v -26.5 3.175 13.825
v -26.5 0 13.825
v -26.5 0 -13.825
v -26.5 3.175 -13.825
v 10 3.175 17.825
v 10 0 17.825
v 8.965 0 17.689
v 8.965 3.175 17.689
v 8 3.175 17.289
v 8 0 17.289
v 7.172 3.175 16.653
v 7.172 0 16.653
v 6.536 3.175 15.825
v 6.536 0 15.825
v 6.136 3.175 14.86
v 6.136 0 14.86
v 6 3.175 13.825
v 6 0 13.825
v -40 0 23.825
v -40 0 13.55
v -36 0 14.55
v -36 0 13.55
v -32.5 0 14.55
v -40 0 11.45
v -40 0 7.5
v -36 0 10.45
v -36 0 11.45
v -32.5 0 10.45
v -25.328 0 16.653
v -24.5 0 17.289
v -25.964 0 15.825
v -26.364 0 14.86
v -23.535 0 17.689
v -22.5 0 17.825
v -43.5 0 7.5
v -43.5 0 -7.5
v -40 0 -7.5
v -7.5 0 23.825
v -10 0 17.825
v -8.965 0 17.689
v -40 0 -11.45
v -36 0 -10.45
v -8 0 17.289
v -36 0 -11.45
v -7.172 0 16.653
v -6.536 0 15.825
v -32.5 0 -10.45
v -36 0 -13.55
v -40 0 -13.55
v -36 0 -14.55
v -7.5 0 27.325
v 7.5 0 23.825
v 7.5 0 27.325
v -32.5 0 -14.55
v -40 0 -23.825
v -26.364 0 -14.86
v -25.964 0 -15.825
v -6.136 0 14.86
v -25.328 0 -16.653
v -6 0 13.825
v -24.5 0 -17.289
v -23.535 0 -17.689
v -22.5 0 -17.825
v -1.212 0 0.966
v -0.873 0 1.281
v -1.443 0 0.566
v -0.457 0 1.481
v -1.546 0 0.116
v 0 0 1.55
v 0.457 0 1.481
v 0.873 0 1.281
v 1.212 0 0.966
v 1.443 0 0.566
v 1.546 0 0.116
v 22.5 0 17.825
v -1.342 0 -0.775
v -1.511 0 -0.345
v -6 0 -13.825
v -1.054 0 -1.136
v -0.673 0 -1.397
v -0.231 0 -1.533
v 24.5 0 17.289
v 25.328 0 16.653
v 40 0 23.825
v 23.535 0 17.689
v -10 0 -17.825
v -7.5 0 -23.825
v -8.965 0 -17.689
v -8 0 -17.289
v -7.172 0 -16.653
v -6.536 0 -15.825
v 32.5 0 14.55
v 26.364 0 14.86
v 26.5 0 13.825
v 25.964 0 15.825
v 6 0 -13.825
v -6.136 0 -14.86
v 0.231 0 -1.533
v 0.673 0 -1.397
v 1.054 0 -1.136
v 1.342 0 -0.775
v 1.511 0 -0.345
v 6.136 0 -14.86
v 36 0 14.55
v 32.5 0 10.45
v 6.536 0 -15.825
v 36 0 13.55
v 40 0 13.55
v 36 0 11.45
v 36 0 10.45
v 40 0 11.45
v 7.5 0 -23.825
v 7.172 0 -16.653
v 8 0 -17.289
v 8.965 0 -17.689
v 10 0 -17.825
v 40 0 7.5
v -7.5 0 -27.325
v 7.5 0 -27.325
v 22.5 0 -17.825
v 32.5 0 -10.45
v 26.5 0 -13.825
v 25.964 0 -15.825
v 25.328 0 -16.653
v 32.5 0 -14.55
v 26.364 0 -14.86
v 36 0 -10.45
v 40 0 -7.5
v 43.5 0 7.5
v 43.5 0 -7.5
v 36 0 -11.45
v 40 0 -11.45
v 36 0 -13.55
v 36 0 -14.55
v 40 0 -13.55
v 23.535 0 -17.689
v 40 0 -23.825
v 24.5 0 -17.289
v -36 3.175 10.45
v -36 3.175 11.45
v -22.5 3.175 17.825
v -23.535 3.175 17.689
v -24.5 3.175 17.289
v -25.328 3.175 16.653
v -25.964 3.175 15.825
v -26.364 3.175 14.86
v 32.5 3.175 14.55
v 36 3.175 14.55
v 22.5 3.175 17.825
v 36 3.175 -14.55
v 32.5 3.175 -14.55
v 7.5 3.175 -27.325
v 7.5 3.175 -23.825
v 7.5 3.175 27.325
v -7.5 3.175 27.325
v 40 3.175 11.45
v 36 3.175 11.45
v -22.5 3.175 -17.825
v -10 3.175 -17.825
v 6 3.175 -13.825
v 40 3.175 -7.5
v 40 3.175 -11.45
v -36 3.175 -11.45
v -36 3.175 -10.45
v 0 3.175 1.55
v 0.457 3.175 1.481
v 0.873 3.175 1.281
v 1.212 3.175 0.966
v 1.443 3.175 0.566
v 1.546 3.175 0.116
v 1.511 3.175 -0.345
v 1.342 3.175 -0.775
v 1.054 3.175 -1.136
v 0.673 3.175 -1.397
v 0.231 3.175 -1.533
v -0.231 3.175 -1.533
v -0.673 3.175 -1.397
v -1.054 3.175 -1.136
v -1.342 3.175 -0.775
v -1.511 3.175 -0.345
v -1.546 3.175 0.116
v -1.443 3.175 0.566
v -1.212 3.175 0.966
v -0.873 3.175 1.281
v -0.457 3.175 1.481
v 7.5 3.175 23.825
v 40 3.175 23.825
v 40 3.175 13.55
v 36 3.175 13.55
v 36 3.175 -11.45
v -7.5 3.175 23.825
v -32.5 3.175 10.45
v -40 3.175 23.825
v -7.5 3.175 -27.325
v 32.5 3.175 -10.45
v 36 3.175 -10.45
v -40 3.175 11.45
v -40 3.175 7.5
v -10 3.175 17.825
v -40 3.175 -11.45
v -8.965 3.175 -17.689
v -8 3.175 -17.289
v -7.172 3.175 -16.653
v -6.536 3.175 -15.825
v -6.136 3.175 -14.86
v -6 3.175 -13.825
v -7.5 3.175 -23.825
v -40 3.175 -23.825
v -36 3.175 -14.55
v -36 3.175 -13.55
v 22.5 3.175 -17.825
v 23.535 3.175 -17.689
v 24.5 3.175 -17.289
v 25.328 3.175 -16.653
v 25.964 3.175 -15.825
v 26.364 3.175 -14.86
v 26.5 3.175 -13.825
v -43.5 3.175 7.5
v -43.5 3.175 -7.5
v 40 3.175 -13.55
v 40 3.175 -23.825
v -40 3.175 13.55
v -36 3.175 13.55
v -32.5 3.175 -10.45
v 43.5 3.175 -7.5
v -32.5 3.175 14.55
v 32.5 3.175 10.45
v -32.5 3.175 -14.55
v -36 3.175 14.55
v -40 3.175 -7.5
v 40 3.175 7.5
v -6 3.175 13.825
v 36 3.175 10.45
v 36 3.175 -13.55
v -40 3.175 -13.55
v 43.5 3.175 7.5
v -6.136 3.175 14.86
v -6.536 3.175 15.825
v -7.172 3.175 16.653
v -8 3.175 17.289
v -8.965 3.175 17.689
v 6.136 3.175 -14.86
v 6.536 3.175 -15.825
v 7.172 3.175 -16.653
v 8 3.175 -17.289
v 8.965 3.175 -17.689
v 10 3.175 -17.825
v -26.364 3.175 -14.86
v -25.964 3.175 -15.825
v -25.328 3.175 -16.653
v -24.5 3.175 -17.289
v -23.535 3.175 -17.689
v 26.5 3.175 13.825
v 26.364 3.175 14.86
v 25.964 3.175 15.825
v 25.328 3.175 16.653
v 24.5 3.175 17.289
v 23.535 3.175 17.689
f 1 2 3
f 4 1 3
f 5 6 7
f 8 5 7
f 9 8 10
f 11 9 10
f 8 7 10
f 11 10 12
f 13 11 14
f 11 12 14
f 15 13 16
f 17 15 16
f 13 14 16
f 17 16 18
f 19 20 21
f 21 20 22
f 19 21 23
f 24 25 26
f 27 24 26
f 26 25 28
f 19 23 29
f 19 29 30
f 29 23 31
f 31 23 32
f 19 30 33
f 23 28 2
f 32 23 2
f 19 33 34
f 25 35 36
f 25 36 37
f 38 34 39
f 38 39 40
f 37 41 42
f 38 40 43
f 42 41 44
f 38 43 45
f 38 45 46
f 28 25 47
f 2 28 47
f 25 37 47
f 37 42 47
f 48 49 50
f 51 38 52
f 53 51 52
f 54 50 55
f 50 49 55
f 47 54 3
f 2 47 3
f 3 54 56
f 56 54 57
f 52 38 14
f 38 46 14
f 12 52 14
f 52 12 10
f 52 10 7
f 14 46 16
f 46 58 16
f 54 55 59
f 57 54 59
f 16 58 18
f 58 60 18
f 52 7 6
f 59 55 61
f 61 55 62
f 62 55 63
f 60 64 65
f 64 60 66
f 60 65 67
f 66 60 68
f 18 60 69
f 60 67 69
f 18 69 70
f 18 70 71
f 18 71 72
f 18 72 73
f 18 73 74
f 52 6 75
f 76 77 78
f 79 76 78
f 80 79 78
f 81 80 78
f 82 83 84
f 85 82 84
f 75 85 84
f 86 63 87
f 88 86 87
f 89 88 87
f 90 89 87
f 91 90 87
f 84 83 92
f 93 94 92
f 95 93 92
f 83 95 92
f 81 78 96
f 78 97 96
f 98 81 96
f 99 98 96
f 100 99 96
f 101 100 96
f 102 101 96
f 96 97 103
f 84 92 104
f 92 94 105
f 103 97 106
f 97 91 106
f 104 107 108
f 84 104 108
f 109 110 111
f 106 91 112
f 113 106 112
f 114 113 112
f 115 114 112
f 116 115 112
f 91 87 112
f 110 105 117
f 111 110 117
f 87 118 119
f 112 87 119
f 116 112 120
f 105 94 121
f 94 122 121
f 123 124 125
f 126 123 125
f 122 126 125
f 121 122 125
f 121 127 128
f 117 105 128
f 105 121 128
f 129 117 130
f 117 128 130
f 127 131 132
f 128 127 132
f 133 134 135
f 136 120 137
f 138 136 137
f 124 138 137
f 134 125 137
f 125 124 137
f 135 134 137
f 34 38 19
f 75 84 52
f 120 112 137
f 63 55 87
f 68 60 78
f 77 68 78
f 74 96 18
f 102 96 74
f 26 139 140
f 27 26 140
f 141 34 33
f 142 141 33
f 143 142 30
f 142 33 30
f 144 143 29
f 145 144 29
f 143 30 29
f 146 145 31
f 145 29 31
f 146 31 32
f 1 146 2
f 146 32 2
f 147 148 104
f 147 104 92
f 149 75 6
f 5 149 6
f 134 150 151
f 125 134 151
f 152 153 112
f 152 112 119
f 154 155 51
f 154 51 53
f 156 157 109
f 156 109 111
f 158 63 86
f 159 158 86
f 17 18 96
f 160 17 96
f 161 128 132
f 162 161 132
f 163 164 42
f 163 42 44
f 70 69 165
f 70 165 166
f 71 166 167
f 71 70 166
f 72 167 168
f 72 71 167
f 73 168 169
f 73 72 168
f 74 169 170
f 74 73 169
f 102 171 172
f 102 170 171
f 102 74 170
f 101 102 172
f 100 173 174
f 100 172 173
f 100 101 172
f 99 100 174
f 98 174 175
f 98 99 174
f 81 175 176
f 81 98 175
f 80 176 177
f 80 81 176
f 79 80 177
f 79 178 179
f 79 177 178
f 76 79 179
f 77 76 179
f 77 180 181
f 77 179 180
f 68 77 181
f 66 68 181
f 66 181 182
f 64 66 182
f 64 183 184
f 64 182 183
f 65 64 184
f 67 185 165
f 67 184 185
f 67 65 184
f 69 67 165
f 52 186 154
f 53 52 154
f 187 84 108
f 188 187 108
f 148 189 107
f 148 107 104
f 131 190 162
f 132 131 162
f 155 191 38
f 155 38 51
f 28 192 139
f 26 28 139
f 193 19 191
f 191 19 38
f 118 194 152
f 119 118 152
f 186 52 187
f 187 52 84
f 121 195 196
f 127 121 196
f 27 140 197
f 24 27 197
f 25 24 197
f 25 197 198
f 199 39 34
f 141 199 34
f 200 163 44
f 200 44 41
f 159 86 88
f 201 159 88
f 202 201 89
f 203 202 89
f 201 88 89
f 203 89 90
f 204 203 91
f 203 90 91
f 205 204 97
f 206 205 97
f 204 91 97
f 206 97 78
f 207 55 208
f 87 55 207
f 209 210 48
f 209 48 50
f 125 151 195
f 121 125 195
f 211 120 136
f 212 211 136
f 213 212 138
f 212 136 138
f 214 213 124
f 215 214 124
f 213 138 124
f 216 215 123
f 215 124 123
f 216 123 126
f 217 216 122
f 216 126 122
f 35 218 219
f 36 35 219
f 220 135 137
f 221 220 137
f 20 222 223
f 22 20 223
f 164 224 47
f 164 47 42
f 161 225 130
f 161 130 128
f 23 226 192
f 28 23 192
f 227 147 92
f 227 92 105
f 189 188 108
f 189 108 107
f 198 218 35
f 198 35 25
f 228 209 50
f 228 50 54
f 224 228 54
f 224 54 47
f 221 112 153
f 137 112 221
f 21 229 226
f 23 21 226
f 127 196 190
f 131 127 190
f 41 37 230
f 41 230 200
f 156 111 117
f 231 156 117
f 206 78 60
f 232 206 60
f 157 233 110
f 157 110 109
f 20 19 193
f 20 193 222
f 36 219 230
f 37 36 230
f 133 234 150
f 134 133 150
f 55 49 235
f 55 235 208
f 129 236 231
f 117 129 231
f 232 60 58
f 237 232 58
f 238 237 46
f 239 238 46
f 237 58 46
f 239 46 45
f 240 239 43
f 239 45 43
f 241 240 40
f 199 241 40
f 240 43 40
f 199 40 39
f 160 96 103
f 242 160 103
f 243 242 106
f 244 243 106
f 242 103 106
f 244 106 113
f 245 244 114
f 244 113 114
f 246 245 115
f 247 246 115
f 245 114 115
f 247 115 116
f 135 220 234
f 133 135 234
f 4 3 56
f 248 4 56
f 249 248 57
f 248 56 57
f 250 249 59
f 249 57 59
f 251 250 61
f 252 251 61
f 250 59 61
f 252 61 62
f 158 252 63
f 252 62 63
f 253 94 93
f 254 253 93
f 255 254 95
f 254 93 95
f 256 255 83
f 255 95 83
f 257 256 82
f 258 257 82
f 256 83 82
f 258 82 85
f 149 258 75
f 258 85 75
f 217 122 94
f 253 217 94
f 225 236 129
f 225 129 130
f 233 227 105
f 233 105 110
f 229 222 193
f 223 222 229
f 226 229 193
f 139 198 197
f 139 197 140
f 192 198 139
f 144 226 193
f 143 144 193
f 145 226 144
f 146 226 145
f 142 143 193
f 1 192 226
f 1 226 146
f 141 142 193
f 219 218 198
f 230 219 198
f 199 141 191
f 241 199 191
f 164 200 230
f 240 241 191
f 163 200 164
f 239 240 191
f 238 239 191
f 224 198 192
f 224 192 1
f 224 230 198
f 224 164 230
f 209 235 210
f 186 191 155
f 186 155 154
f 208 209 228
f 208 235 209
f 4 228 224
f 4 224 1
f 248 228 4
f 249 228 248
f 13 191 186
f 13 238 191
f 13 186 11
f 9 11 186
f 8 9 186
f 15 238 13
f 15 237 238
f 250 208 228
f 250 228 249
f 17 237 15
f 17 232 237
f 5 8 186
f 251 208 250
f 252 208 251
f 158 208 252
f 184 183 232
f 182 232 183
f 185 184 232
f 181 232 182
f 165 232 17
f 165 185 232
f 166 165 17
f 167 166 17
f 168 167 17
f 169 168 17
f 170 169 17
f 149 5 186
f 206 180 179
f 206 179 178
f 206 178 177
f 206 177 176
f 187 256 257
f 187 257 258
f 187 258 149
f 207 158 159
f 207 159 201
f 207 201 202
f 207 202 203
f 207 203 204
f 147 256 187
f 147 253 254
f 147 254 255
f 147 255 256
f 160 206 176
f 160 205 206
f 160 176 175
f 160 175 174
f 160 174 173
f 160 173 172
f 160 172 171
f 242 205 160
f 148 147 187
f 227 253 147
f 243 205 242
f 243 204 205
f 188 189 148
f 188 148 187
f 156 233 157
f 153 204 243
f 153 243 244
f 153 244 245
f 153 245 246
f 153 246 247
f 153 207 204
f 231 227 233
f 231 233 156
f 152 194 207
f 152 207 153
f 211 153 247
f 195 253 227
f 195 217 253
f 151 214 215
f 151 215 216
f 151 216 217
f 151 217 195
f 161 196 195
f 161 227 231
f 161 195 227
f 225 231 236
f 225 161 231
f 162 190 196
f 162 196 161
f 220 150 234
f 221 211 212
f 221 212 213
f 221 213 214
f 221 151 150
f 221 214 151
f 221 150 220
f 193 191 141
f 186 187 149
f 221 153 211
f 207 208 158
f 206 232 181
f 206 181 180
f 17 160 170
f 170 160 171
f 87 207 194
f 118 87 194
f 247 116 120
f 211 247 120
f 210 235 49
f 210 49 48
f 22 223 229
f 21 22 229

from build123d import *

# Parameters (mm, degrees)
SKETCH2_W               = 80
SKETCH2_H               = 47.65
BOSS_EXTRUDE1_DEPTH     = 3.175
SKETCH3_W               = 15
SKETCH3_H               = 3.5
BOSS_EXTRUDE2_DEPTH     = 3.175
SKETCH4_W               = 3.5
SKETCH4_H               = 15
BOSS_EXTRUDE3_DEPTH     = 3.175
MIRROR2_COPY_1_SKETCH_W = 3.5
MIRROR2_COPY_1_SKETCH_H = 15
MIRROR2_COPY_1_DEPTH    = 3.175
MIRROR2_COPY_2_SKETCH_W = 3.5
MIRROR2_COPY_2_SKETCH_H = 15
MIRROR2_COPY_2_DEPTH    = 3.175
CUT_EXTRUDE1_DEPTH      = 10
MIRROR4_COPY_1_DEPTH    = 10
CUT_EXTRUDE6_DEPTH      = 52.468303353
CUT_EXTRUDE6_DEPTH_BACK = 52.468303353
SKETCH7_R               = 1.55
CUT_EXTRUDE7_DEPTH      = 52.468303353
CUT_EXTRUDE7_DEPTH_BACK = 52.468303353


with BuildPart() as part:
    # Sketch2 → Boss-Extrude1 (new body)
    with BuildSketch(Plane(origin=(0, 0, 0), x_dir=(1, 0, 0), z_dir=(0, 1, 0))):
        Rectangle(SKETCH2_W, SKETCH2_H)
    extrude(amount=BOSS_EXTRUDE1_DEPTH)

    # Sketch3 → Boss-Extrude2 (add)
    with BuildSketch(Plane(origin=(0, 3.175, 0), x_dir=(1, 0, 0), z_dir=(0, 1, 0))):
        with Locations((0, 25.575)):
            Rectangle(SKETCH3_W, SKETCH3_H)
    boss_extrude2 = extrude(amount=-BOSS_EXTRUDE2_DEPTH)

    # Sketch4 → Boss-Extrude3 (add)
    with BuildSketch(Plane(origin=(0, 3.175, 0), x_dir=(1, 0, 0), z_dir=(0, 1, 0))):
        with Locations((-41.75, 0)):
            Rectangle(SKETCH4_W, SKETCH4_H)
    boss_extrude3 = extrude(amount=-BOSS_EXTRUDE3_DEPTH)

    # Mirror1: Boss-Extrude3 across plane
    add(boss_extrude3.mirror(Plane(origin=(0, 0, 0), x_dir=(0, 0, 1), z_dir=(1, 0, 0))))

    # Mirror2: Boss-Extrude2 across plane
    add(boss_extrude2.mirror(Plane.XY))

    # Mirror2 copy 1 sketch → Mirror2 copy 1 (add)
    with BuildSketch(Plane(origin=(0, 3.175, 0), x_dir=(-1, 0, 0), z_dir=(0, 1, 0))):
        with Locations((-41.75, 0)):
            Rectangle(MIRROR2_COPY_1_SKETCH_W, MIRROR2_COPY_1_SKETCH_H)
    extrude(amount=-MIRROR2_COPY_1_DEPTH)

    # Mirror2 copy 2 sketch → Mirror2 copy 2 (add)
    with BuildSketch(Plane(origin=(0, 3.175, 0), x_dir=(1, 0, 0), z_dir=(0, 1, 0))):
        with Locations((-41.75, 0)):
            Rectangle(MIRROR2_COPY_2_SKETCH_W, MIRROR2_COPY_2_SKETCH_H)
    extrude(amount=-MIRROR2_COPY_2_DEPTH)

    # Sketch5 → Cut-Extrude1 (cut)
    with BuildSketch(Plane(origin=(0, 3.175, 0), x_dir=(1, 0, 0), z_dir=(0, 1, 0))):
        Polygon((-40, 13.55), (-36, 13.55), (-36, 14.55), (-32.5, 14.55), (-32.5, 10.45), (-36, 10.45), (-36, 11.45), (-40, 11.45), align=None)
    cut_extrude1 = extrude(amount=-CUT_EXTRUDE1_DEPTH, mode=Mode.SUBTRACT)

    # Mirror3: Cut-Extrude1 across plane
    add(cut_extrude1.mirror(Plane.XY), mode=Mode.SUBTRACT)

    # Mirror4: Cut-Extrude1 across plane
    add(cut_extrude1.mirror(Plane(origin=(0, 0, 0), x_dir=(0, 0, 1), z_dir=(1, 0, 0))), mode=Mode.SUBTRACT)

    # Mirror4 copy 1 sketch → Mirror4 copy 1 (cut)
    with BuildSketch(Plane(origin=(0, 3.175, 0), x_dir=(-1, 0, 0), z_dir=(0, 1, 0))):
        Polygon((-40, 13.55), (-36, 13.55), (-36, 14.55), (-32.5, 14.55), (-32.5, 10.45), (-36, 10.45), (-36, 11.45), (-40, 11.45), align=None)
    extrude(amount=-MIRROR4_COPY_1_DEPTH, mode=Mode.SUBTRACT)

    # Sketch7 → Cut-Extrude6 (cut, two sides: drawn at the far end of the back side and taken through both)
    with BuildSketch(Plane(origin=(0, 0, 0), x_dir=(1, 0, 0), z_dir=(0, 1, 0)).offset(-CUT_EXTRUDE6_DEPTH_BACK)):
        with Locations(Location((0, 0, 0), (0, 0, 270))):
            Circle(SKETCH7_R)
    extrude(amount=CUT_EXTRUDE6_DEPTH + CUT_EXTRUDE6_DEPTH_BACK, mode=Mode.SUBTRACT)

    # Sketch8 → Cut-Extrude7 (cut, two sides: drawn at the far end of the back side and taken through both)
    with BuildSketch(Plane(origin=(0, 3.175, 0), x_dir=(1, 0, 0), z_dir=(0, 1, 0)).offset(-CUT_EXTRUDE7_DEPTH_BACK)):
        with BuildLine():
            Line((-22.5, 17.825), (-10, 17.825))
            ThreePointArc((-10, 17.825), (-7.171572875, 16.653427125), (-6, 13.825))
            Line((-6, 13.825), (-6, -13.825))
            ThreePointArc((-6, -13.825), (-7.171572875, -16.653427125), (-10, -17.825))
            Line((-10, -17.825), (-22.5, -17.825))
            ThreePointArc((-22.5, -17.825), (-25.328427125, -16.653427125), (-26.5, -13.825))
            Line((-26.5, -13.825), (-26.5, 13.825))
            ThreePointArc((-26.5, 13.825), (-25.328427125, 16.653427125), (-22.5, 17.825))
        make_face()
        with BuildLine():
            Line((22.5, -17.825), (10, -17.825))
            ThreePointArc((10, -17.825), (7.171572875, -16.653427125), (6, -13.825))
            Line((6, -13.825), (6, 13.825))
            ThreePointArc((6, 13.825), (7.171572875, 16.653427125), (10, 17.825))
            Line((10, 17.825), (22.5, 17.825))
            ThreePointArc((22.5, 17.825), (25.328427125, 16.653427125), (26.5, 13.825))
            Line((26.5, 13.825), (26.5, -13.825))
            ThreePointArc((26.5, -13.825), (25.328427125, -16.653427125), (22.5, -17.825))
        make_face()
    extrude(amount=CUT_EXTRUDE7_DEPTH + CUT_EXTRUDE7_DEPTH_BACK, mode=Mode.SUBTRACT)


solid = part.part
